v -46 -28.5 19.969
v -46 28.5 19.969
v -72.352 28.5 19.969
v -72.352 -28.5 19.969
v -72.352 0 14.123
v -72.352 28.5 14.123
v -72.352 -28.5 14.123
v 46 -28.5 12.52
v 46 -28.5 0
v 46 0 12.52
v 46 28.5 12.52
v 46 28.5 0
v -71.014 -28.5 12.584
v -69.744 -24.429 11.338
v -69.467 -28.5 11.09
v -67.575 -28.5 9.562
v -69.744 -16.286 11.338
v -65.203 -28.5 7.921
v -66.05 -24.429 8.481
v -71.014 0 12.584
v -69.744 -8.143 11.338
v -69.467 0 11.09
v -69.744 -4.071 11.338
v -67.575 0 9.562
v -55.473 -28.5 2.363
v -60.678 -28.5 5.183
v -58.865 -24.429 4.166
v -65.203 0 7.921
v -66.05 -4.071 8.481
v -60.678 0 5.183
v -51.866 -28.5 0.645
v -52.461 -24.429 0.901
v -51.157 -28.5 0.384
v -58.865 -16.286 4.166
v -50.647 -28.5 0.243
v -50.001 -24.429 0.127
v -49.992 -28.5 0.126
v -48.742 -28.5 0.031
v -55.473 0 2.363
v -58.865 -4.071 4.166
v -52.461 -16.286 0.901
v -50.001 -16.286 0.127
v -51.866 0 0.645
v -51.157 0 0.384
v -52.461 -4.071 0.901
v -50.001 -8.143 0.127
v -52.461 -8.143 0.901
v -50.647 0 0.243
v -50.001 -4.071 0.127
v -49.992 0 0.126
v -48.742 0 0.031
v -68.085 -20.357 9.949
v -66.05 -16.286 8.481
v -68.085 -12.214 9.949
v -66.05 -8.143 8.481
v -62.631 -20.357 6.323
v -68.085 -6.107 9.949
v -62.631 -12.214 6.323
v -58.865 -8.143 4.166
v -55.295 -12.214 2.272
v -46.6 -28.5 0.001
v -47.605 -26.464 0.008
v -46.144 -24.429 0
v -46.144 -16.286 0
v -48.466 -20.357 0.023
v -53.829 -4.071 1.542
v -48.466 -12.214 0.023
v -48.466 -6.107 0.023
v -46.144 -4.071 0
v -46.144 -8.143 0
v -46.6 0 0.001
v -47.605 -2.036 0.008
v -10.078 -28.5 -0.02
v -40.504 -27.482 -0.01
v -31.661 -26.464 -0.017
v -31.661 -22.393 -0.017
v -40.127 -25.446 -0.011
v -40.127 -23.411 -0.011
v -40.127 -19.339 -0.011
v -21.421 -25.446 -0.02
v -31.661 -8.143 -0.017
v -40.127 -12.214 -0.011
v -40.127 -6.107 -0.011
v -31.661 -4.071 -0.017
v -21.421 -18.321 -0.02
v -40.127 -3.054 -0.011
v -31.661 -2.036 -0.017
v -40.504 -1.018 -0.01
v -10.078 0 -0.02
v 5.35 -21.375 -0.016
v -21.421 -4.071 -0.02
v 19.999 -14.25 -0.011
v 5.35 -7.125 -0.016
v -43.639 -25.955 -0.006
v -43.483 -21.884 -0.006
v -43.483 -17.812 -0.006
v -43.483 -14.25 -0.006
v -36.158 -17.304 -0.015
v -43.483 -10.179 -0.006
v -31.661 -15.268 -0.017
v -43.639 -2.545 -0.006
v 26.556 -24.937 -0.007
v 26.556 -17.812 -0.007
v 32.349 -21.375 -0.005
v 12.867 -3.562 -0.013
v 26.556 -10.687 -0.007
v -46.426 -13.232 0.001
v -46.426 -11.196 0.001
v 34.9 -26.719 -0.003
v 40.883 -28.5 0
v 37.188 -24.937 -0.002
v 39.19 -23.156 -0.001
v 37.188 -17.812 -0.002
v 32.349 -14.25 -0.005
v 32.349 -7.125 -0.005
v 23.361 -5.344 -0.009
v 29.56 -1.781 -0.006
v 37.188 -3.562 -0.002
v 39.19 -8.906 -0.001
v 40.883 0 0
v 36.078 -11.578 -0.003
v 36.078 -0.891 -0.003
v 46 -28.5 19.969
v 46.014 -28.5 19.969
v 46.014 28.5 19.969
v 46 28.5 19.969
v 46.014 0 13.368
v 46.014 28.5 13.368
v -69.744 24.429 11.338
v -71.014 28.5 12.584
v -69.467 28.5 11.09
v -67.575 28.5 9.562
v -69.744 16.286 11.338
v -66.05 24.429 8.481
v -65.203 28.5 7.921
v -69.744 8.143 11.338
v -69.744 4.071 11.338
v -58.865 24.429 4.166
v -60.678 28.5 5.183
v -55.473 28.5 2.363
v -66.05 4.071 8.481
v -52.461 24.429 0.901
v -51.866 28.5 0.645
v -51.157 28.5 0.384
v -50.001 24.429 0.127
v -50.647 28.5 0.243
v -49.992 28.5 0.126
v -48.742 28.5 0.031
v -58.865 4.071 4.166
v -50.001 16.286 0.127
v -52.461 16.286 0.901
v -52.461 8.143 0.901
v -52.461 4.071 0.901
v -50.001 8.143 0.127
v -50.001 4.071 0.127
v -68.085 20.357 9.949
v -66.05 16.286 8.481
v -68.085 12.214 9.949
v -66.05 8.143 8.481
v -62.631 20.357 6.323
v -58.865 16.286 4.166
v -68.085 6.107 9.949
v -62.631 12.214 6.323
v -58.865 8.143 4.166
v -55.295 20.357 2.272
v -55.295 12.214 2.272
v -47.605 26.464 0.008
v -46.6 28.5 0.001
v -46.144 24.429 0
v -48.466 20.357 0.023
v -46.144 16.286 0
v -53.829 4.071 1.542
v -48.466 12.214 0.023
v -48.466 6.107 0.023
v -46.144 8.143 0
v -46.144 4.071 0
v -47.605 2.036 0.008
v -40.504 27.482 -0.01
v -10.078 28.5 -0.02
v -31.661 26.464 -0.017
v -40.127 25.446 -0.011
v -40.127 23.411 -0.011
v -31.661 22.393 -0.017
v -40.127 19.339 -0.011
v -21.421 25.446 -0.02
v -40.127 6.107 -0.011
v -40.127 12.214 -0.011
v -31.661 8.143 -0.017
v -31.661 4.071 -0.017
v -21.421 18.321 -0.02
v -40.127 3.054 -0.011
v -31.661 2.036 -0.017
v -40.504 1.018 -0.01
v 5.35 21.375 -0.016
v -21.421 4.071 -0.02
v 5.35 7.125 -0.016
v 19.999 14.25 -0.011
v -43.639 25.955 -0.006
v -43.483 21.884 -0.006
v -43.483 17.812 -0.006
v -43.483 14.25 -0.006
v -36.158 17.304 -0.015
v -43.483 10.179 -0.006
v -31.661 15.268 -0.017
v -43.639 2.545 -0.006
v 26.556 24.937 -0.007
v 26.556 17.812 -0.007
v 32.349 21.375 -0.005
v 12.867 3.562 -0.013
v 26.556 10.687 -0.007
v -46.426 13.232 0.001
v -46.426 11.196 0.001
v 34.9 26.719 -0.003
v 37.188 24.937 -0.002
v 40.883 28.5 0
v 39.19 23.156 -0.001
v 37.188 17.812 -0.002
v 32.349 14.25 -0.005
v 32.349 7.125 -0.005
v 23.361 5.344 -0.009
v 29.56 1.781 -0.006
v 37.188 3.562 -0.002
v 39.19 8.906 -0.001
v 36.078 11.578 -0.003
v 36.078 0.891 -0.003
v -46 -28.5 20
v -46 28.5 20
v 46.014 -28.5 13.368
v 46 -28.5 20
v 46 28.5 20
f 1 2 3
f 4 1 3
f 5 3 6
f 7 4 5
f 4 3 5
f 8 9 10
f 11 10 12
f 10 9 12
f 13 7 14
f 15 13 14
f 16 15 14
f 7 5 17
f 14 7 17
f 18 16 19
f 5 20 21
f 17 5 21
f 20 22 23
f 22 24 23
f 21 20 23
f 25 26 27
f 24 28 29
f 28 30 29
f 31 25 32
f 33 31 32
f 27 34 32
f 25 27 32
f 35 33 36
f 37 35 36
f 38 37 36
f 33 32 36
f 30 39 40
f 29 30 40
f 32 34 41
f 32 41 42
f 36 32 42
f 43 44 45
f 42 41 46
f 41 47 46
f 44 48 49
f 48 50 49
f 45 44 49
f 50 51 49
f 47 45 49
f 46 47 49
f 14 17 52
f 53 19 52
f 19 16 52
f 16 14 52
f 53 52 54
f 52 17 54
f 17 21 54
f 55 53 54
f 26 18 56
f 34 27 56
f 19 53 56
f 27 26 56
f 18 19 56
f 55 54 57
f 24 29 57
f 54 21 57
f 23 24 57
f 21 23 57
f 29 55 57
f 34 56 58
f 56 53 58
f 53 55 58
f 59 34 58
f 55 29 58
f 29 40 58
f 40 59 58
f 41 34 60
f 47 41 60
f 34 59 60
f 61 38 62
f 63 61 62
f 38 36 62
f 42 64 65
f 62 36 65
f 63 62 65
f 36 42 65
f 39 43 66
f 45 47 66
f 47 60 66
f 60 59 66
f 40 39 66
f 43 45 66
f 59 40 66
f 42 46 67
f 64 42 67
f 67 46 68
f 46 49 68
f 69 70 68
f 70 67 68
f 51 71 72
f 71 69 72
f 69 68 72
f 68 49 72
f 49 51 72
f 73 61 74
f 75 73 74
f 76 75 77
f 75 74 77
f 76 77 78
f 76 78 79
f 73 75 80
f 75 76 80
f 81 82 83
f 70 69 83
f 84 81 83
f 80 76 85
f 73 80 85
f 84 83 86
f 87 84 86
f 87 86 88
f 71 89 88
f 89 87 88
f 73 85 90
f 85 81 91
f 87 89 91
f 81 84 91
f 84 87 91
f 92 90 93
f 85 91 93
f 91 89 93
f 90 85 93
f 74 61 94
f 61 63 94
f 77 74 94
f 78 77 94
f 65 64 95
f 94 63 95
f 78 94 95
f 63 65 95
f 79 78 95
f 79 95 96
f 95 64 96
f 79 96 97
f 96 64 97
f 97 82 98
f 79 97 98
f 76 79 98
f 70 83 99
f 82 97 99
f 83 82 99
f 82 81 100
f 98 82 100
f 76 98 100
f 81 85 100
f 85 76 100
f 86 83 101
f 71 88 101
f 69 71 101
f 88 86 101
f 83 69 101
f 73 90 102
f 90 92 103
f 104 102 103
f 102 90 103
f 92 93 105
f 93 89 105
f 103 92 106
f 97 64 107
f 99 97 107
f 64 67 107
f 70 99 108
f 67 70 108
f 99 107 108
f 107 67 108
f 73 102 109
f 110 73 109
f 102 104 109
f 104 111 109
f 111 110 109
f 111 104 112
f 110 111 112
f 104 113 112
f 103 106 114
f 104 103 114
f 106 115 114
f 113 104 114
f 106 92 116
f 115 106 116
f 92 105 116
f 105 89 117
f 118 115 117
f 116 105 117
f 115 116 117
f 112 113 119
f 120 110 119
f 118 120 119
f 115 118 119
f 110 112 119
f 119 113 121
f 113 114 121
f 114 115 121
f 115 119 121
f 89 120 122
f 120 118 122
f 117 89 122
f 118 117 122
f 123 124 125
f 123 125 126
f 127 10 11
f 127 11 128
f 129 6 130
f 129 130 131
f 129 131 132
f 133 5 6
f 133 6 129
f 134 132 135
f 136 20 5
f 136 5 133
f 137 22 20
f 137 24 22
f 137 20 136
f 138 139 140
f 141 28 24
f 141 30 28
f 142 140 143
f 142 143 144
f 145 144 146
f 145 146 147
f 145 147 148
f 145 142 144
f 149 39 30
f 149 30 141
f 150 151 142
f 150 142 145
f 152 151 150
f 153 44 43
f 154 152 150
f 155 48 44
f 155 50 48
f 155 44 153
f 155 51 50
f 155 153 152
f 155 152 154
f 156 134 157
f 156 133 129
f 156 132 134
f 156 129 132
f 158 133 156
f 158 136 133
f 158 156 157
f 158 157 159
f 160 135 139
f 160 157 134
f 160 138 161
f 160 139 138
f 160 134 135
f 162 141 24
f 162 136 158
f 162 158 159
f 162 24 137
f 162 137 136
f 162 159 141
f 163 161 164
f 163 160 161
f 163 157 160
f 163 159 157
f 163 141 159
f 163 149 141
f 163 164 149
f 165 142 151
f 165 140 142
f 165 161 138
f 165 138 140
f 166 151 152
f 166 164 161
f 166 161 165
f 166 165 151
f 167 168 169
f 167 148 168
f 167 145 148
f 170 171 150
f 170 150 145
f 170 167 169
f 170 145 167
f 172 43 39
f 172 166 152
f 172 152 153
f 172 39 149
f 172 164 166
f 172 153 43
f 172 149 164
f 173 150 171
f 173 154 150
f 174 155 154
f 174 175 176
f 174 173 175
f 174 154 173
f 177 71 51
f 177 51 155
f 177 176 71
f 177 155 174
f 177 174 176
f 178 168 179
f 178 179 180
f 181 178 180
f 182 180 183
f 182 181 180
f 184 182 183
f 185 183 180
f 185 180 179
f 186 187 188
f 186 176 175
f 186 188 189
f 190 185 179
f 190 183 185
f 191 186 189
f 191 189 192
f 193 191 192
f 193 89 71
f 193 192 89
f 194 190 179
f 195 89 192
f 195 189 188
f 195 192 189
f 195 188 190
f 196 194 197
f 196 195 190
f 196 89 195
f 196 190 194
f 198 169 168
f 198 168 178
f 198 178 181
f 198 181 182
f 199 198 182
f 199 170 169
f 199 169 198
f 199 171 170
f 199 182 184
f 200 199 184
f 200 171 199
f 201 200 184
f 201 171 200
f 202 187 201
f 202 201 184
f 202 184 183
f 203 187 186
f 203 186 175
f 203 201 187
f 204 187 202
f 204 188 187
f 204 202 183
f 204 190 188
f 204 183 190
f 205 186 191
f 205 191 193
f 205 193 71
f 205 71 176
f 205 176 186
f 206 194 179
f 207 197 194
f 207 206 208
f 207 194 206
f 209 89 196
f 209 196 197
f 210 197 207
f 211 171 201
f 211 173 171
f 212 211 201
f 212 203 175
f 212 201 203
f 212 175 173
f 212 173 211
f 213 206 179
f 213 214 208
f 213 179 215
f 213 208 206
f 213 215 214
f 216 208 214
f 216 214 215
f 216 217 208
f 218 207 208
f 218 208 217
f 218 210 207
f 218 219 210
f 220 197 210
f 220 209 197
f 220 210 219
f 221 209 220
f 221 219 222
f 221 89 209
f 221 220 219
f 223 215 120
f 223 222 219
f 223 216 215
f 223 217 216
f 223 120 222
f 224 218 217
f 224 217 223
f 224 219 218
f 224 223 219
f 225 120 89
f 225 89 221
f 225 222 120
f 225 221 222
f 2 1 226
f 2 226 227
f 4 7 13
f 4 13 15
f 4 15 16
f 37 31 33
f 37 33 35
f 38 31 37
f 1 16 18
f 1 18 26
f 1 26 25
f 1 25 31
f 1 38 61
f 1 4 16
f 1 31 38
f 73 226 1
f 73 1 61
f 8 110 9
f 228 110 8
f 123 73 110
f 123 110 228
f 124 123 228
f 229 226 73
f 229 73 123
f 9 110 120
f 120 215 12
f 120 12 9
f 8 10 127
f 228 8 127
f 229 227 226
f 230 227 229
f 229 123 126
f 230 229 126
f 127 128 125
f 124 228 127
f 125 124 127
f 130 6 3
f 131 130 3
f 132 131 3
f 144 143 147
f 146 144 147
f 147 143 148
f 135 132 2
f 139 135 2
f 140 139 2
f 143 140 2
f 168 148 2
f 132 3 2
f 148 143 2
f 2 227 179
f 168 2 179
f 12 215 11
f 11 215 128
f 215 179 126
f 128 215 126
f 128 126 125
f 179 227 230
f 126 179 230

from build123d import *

# Parameters (mm, degrees)
F0_W     = 92
F0_H     = 57
F1_DEPTH = 20
F3_DEPTH = 28.5


with BuildPart() as f1:
    # F0 (on Top) → F1 (new body)
    with BuildSketch(Plane.XY):
        Rectangle(F0_W, F0_H)
    extrude(amount=F1_DEPTH)

    # F2 (on Front) → F3 (join, symmetric)
    with BuildSketch(Plane.XZ):
        with BuildLine():
            add(Edge.make_bspline(
                [(-72.352286854, 14.1225020504), (-70.7868680165, 12.1818560467), (-66.7235831643, 8.2633703724), (-51.3726170989, 0.0536119118), (-47.9178431553, -0.0501145074), (40.2776295905, -2.08522e-05), (46.0383226643, 0.002674896), (45.9645196982, 4.7811559883), (45.9713565107, 11.2640567196), (46.0139377281, 13.3675688924)],
                knots=[0, 0, 0, 0, 0.112628314, 0.2653870111, 0.3632089544, 0.7244735131, 0.8094160846, 0.8854591422, 1, 1, 1, 1], degree=3))
            Line((46.0139377281, 13.3675688924), (46.0139377281, 19.9693925679))
            Line((46.0139377281, 19.9693925679), (-72.352286854, 19.9693925679))
            Line((-72.352286854, 19.9693925679), (-72.352286854, 14.1225020504))
        make_face()
    extrude(amount=F3_DEPTH, both=True)


solid = f1.part
